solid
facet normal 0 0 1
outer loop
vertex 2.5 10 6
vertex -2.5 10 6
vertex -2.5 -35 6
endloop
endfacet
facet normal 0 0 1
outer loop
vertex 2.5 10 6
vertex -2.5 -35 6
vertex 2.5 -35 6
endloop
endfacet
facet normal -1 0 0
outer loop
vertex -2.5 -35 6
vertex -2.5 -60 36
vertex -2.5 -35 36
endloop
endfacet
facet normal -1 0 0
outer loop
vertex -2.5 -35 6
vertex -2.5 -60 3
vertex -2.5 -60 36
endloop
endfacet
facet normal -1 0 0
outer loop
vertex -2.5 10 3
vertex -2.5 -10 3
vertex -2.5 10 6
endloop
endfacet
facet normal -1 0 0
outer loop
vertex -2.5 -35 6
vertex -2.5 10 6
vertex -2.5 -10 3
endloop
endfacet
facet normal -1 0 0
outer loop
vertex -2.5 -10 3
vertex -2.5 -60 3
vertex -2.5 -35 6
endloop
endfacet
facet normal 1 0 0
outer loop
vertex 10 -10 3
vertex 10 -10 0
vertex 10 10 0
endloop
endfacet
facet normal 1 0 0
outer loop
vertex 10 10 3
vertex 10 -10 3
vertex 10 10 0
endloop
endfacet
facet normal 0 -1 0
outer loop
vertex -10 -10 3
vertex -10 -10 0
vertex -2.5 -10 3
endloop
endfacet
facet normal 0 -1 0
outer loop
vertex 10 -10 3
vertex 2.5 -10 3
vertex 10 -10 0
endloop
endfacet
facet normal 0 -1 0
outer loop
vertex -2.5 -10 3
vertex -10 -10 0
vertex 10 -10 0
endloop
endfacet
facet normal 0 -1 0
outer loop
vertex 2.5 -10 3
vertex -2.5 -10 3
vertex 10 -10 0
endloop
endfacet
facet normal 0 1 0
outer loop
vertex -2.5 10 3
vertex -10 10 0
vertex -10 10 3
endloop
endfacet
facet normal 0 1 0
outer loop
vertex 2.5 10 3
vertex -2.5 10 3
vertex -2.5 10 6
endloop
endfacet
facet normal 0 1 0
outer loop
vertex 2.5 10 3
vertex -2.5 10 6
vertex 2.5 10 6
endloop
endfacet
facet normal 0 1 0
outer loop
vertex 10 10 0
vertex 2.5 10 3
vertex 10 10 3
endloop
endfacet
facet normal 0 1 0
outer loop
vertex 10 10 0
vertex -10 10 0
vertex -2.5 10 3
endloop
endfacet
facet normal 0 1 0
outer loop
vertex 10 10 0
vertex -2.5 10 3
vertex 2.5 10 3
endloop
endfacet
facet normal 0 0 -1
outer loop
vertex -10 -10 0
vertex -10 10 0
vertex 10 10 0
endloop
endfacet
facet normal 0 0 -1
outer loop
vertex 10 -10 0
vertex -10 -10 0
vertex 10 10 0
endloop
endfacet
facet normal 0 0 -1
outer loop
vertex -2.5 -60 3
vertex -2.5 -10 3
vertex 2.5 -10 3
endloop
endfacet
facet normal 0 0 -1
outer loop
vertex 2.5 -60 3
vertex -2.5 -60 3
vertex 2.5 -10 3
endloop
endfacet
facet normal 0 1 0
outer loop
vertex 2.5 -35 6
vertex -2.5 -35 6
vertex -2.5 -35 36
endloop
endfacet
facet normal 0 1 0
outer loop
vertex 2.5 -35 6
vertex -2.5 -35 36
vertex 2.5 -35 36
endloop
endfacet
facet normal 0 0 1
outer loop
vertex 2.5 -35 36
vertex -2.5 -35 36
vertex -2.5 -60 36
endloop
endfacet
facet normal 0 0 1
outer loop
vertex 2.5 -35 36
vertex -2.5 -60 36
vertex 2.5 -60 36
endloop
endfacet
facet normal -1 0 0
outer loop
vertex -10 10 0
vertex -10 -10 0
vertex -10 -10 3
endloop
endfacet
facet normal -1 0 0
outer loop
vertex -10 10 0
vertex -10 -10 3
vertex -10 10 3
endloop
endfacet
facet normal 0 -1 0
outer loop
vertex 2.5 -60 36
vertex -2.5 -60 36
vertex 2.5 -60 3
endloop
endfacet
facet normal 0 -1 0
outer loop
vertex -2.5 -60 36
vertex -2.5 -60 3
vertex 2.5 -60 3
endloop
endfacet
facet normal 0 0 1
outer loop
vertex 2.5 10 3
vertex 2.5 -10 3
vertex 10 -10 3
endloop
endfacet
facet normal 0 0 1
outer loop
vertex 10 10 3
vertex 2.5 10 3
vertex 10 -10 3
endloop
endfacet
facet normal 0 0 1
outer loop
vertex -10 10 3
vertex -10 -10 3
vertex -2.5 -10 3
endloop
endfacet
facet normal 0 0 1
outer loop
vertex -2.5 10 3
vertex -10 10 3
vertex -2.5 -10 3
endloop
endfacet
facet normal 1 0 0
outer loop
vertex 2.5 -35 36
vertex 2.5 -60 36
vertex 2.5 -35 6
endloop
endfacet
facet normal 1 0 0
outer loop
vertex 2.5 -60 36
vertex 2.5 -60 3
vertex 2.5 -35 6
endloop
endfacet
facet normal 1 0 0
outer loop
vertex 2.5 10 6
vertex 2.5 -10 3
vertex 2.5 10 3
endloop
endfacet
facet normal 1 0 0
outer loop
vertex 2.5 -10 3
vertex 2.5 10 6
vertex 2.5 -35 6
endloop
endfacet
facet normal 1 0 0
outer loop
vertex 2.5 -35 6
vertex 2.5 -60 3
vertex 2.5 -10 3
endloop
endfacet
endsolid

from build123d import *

# Parameters (mm, degrees)
SKETCH_1_W      = 20
SKETCH_1_H      = 20
EXTRUDE_1_DEPTH = 3
SKETCH_2_W      = 5
SKETCH_2_H      = 20
EXTRUDE_2_DEPTH = 3
SKETCH_3_W      = 5
SKETCH_3_H      = 3
EXTRUDE_3_DEPTH = 50
SKETCH_4_W      = 5
SKETCH_4_H      = 25
EXTRUDE_4_DEPTH = 30


with BuildPart() as part:
    # 草图1 → 凸台-拉伸1 (new body)
    with BuildSketch(Plane.XY):
        Rectangle(SKETCH_1_W, SKETCH_1_H)
    extrude(amount=EXTRUDE_1_DEPTH)

    # 草图2 → 凸台-拉伸2 (add)
    with BuildSketch(Plane.XY.offset(3)):
        Rectangle(SKETCH_2_W, SKETCH_2_H)
    extrude(amount=EXTRUDE_2_DEPTH)

    # 草图3 → 凸台-拉伸3 (add)
    with BuildSketch(Plane.XZ.offset(10)):
        with Locations((0, 4.5)):
            Rectangle(SKETCH_3_W, SKETCH_3_H)
    extrude(amount=EXTRUDE_3_DEPTH)

    # 草图4 → 凸台-拉伸4 (add)
    with BuildSketch(Plane.XY.offset(6)):
        with Locations((0, -47.5)):
            Rectangle(SKETCH_4_W, SKETCH_4_H)
    extrude(amount=EXTRUDE_4_DEPTH)


solid = part.part
